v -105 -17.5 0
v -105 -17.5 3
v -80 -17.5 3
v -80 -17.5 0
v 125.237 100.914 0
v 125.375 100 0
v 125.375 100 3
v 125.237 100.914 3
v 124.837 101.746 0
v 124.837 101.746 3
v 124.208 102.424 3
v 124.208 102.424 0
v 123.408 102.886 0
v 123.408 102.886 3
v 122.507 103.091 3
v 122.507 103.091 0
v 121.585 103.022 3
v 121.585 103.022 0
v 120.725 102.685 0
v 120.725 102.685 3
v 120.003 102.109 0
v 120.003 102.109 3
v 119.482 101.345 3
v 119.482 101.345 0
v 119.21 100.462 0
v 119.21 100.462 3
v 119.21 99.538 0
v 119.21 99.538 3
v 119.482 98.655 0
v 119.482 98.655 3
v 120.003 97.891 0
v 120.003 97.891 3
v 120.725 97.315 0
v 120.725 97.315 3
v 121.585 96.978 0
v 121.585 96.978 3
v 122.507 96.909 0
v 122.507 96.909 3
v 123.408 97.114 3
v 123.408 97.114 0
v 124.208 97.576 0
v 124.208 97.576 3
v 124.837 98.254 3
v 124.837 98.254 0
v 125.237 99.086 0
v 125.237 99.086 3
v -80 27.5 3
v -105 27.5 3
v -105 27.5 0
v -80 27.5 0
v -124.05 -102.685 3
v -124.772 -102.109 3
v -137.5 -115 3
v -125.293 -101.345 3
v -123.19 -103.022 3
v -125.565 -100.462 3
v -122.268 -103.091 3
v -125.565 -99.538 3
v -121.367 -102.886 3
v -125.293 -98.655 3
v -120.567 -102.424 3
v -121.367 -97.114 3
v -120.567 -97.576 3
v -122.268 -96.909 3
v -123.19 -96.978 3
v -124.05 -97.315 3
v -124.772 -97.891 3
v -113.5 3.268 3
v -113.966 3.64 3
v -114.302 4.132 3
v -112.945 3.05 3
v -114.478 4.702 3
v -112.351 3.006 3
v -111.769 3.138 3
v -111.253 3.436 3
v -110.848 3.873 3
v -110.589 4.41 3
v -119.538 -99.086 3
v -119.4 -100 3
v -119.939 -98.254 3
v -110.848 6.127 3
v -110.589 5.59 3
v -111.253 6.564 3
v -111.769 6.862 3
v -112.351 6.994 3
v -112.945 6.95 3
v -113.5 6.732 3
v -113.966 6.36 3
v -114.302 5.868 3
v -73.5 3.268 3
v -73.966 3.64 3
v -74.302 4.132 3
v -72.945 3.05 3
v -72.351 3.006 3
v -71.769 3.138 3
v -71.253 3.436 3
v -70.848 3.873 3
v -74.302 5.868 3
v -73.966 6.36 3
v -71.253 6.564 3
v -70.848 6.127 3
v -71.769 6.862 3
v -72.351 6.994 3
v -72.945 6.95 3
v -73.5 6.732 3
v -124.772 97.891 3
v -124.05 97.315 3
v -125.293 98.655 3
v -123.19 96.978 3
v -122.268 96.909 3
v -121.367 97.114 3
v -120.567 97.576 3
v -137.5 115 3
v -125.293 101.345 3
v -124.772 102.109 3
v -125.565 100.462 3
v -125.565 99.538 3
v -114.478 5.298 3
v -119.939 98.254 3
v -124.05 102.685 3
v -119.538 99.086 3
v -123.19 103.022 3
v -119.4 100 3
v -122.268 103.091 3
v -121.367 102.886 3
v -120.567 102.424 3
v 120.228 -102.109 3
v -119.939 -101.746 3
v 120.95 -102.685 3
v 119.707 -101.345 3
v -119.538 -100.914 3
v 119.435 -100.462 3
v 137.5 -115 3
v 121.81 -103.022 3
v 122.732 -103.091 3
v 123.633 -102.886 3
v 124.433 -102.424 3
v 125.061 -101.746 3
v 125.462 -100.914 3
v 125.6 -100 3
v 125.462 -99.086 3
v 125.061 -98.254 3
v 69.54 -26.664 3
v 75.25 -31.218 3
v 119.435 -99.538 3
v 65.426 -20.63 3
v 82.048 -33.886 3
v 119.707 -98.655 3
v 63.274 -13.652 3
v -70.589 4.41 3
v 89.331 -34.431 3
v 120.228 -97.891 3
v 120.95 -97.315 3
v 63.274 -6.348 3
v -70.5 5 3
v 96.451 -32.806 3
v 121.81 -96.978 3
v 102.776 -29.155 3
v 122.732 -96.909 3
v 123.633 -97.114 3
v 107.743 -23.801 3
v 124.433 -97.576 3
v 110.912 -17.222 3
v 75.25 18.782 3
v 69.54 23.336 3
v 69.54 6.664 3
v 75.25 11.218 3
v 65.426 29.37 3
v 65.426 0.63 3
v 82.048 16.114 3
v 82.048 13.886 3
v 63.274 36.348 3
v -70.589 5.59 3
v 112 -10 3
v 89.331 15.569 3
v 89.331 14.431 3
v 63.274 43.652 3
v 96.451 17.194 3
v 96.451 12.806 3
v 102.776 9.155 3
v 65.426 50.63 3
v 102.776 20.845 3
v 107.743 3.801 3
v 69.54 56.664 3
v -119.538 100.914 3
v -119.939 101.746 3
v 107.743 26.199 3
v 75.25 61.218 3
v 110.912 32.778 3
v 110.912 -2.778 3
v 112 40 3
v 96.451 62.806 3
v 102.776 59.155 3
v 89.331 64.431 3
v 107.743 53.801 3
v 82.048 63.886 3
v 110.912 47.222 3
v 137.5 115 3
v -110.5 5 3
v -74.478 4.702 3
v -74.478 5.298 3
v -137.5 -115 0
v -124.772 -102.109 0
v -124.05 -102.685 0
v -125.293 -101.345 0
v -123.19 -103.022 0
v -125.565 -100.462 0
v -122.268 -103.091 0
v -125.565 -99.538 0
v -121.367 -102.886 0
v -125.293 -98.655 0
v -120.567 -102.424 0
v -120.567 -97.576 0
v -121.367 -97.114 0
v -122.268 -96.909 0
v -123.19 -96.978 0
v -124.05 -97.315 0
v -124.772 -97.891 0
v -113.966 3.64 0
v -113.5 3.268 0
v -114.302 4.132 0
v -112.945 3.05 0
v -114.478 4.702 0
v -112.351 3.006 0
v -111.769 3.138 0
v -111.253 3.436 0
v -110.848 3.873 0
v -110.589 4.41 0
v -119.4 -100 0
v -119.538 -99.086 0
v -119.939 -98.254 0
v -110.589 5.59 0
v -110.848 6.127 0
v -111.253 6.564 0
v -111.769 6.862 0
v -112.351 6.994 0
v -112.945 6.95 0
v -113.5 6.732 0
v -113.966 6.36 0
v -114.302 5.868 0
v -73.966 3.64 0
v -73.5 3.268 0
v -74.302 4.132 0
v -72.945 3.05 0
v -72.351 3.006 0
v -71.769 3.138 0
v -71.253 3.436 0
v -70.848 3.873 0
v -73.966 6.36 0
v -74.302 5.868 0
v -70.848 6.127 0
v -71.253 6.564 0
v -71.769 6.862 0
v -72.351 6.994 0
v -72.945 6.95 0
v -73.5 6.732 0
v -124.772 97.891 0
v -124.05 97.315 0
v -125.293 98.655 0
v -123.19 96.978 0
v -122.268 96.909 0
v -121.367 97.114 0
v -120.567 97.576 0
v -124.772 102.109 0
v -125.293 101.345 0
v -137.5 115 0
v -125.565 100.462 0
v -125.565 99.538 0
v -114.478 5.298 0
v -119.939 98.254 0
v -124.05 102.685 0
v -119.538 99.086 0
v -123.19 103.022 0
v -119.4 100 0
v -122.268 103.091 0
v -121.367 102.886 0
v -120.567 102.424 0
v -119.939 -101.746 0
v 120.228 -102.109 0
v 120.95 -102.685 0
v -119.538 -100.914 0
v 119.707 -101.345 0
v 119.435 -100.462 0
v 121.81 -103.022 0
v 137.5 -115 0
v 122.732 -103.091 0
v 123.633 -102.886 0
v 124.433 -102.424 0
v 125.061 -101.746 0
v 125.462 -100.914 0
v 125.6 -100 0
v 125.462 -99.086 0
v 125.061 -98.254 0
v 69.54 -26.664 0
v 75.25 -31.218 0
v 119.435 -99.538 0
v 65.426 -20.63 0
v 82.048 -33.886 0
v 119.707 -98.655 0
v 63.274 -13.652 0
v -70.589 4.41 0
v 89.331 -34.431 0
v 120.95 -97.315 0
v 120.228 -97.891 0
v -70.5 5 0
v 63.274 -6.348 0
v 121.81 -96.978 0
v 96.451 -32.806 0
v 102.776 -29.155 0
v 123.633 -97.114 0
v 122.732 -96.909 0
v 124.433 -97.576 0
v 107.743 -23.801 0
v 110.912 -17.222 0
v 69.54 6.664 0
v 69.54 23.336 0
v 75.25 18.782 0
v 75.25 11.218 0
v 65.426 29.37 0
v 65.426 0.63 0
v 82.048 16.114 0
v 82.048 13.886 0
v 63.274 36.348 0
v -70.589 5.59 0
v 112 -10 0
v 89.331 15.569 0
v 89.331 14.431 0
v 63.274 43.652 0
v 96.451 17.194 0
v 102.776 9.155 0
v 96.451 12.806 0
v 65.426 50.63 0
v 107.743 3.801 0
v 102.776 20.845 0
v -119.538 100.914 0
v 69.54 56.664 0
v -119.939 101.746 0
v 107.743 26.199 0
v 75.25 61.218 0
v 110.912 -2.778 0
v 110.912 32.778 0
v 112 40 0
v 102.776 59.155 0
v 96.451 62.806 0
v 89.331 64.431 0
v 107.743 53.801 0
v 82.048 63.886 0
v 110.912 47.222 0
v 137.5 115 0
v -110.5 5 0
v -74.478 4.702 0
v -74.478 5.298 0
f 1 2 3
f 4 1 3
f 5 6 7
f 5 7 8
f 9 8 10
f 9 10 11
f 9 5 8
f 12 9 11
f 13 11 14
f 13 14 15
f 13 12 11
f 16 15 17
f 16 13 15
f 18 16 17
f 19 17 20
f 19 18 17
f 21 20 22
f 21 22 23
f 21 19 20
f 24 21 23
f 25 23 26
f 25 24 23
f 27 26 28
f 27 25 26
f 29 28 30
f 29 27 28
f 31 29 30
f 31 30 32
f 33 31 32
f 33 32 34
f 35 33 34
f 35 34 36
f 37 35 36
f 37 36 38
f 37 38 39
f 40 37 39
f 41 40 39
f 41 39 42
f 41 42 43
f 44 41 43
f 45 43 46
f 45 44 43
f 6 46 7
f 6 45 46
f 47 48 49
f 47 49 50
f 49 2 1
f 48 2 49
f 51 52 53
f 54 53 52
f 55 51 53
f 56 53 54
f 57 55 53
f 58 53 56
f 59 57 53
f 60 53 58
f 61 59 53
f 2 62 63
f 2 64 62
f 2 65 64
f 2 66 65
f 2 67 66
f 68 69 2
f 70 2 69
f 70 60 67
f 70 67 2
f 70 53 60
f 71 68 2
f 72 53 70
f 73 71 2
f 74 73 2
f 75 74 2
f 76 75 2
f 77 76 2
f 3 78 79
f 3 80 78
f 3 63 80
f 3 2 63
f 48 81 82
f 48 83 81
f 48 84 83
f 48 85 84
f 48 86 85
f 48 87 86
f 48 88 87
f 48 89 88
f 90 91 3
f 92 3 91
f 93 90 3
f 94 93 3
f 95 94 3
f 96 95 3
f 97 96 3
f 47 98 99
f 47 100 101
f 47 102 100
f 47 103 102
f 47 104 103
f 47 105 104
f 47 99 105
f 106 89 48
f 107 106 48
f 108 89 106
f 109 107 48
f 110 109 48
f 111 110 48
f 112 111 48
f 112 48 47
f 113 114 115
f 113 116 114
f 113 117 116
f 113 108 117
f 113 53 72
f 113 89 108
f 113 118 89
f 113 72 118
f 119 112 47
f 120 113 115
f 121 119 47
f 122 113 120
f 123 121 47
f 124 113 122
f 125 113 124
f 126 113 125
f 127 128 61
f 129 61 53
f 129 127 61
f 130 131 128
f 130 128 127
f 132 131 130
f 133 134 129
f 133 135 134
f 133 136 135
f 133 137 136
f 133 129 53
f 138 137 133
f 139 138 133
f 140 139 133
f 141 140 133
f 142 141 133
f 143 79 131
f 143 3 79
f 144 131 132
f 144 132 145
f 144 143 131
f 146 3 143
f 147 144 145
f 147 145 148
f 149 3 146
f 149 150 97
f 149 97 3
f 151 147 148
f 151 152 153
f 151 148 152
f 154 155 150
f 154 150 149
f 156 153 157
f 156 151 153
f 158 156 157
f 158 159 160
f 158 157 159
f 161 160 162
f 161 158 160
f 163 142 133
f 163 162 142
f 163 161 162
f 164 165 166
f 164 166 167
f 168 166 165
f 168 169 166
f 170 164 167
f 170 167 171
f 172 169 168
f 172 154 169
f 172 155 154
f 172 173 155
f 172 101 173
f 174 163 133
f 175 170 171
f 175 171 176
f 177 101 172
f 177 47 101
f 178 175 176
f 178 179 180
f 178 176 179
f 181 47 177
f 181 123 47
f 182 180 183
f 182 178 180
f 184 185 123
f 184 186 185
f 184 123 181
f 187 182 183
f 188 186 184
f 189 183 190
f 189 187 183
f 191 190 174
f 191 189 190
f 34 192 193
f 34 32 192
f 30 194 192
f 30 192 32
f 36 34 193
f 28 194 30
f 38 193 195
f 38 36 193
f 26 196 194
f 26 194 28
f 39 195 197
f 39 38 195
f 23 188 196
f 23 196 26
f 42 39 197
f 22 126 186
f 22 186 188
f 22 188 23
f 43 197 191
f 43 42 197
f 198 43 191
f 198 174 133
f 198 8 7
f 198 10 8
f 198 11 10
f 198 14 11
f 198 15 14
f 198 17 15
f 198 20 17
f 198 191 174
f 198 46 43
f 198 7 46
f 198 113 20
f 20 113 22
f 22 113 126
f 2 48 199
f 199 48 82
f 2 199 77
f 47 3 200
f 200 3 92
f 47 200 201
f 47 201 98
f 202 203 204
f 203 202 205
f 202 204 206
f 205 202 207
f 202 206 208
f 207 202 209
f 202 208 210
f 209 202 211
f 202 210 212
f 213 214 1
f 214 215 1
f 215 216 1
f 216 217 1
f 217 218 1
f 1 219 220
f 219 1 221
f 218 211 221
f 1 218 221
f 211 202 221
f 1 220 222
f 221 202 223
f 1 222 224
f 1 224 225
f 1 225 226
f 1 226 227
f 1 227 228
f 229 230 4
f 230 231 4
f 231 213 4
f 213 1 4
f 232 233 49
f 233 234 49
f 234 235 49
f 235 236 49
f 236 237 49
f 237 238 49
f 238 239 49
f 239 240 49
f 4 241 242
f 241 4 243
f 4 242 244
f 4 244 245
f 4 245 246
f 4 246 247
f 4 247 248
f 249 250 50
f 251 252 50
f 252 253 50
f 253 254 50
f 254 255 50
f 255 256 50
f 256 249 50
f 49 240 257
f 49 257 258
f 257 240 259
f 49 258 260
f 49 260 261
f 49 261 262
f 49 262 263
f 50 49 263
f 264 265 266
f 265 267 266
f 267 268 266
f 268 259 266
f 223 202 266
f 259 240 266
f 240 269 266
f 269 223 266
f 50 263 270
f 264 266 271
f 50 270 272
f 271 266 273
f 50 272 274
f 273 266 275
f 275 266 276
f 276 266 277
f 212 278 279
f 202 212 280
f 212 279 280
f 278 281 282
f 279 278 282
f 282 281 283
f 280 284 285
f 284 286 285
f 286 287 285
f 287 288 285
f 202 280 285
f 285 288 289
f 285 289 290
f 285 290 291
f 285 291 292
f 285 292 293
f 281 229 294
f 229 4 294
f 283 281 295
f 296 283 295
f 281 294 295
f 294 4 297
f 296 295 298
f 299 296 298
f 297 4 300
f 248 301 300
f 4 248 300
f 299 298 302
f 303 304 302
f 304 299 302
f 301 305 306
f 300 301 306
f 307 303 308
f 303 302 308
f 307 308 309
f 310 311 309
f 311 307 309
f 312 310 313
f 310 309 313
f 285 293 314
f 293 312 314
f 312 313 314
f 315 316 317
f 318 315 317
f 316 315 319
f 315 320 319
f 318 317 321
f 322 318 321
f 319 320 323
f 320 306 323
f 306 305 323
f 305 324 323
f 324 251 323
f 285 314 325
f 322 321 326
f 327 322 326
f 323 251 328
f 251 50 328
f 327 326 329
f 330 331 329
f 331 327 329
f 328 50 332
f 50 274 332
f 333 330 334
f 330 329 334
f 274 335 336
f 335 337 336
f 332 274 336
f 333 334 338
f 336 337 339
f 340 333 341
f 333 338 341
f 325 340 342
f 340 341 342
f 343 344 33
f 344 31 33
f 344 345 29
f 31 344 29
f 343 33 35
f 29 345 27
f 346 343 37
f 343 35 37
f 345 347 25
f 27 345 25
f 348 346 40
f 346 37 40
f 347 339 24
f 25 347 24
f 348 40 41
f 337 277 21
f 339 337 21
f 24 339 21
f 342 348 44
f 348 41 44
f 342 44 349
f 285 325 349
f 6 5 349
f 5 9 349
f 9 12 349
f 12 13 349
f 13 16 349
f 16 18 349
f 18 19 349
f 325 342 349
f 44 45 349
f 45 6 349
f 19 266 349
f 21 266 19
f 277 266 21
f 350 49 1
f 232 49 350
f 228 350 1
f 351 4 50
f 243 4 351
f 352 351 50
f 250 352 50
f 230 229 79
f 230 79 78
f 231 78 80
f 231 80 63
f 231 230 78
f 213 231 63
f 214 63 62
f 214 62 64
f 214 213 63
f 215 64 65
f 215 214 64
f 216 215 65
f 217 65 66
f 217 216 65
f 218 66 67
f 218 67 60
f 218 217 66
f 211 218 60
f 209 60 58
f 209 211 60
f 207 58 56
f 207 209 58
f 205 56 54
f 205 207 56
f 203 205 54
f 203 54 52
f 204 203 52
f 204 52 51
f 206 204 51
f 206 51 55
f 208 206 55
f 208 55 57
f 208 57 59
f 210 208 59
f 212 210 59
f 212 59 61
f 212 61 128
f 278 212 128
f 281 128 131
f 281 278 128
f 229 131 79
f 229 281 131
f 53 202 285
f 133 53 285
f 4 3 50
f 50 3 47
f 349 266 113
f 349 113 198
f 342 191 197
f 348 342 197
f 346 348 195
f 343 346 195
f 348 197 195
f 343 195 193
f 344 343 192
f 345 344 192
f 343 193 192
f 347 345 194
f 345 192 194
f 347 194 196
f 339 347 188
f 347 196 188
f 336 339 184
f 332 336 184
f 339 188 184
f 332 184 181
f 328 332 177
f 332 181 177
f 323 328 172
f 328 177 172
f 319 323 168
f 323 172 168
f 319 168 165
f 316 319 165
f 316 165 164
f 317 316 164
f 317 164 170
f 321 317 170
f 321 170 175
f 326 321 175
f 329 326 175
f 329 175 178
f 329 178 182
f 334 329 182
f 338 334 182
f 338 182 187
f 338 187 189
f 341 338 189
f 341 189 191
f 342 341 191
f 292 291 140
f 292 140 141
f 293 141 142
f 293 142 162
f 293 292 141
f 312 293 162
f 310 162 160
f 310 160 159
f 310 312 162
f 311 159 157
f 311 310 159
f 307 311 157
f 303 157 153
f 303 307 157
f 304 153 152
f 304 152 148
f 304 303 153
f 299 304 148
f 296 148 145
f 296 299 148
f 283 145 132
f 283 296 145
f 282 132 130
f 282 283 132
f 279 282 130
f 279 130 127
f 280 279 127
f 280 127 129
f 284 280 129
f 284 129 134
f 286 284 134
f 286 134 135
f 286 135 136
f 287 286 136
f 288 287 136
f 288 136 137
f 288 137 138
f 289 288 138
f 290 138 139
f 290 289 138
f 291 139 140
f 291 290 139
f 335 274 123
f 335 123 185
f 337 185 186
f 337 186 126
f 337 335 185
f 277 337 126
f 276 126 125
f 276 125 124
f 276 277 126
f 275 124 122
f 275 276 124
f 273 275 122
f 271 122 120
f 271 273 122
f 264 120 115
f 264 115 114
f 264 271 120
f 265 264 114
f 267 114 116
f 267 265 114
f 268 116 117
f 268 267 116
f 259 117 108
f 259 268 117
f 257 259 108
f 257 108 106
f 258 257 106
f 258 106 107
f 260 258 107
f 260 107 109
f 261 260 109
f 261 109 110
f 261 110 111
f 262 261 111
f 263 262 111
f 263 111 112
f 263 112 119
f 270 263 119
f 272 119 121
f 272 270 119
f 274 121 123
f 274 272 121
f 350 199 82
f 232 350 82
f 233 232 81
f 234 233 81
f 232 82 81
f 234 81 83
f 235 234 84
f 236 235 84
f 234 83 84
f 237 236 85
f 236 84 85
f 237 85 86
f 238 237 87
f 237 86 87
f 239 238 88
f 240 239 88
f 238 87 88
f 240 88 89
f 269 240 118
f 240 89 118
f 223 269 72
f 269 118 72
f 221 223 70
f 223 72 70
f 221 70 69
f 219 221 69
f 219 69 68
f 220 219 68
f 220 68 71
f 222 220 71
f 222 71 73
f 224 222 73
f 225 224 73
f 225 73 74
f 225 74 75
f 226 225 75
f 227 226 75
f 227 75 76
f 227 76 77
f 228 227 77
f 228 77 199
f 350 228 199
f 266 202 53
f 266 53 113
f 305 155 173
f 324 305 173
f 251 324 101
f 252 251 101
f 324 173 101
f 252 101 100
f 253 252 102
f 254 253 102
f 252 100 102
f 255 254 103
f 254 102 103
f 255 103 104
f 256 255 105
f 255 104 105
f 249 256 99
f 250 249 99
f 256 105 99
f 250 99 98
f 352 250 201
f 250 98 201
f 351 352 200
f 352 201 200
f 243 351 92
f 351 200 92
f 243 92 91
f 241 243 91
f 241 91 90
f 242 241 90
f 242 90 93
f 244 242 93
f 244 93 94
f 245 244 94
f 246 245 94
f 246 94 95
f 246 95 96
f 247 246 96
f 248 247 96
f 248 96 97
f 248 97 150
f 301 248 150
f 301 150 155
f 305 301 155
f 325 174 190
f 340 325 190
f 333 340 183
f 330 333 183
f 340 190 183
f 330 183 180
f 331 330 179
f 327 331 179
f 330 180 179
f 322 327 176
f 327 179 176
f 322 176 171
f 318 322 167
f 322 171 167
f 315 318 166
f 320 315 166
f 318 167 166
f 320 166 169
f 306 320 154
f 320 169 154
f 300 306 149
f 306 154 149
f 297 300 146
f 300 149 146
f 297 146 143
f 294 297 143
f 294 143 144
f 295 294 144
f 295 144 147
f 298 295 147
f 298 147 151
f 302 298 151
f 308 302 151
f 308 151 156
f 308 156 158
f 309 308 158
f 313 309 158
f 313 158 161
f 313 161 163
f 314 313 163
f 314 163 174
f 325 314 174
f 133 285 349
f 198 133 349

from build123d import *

# Parameters (mm, degrees)
CROQUIS1_W              = 275
CROQUIS1_H              = 230
CROQUIS1_R              = 3.1
SALIENTE_EXTRUIR1_DEPTH = 3
CROQUIS2_R              = 24.5
CORTAR_EXTRUIR1_DEPTH   = 4
CROQUIS3_R              = 2
CROQUIS3_W              = 25
CROQUIS3_H              = 45
CORTAR_EXTRUIR2_DEPTH   = 4


with BuildPart() as part:
    # Croquis1 → Saliente-Extruir1 (new body)
    with BuildSketch(Plane.XY):
        Rectangle(CROQUIS1_W, CROQUIS1_H)
        with Locations((-122.5, 100)):
            Circle(CROQUIS1_R, mode=Mode.SUBTRACT)
        with Locations((122.275174875, 100)):
            Circle(CROQUIS1_R, mode=Mode.SUBTRACT)
        with Locations((-122.5, -100)):
            Circle(CROQUIS1_R, mode=Mode.SUBTRACT)
        with Locations((122.5, -100)):
            Circle(CROQUIS1_R, mode=Mode.SUBTRACT)
    extrude(amount=SALIENTE_EXTRUIR1_DEPTH)

    # Croquis2 → Cortar-Extruir1 (cut, through all)
    with BuildSketch(Plane.XY.offset(3)):
        with Locations((87.5, 40)):
            Circle(CROQUIS2_R)
        with Locations((87.5, -10)):
            Circle(CROQUIS2_R)
    extrude(amount=-CORTAR_EXTRUIR1_DEPTH, mode=Mode.SUBTRACT)

    # Croquis3 → Cortar-Extruir2 (cut, through all)
    with BuildSketch(Plane.XY.offset(3)):
        with Locations((-112.5, 5)):
            Circle(CROQUIS3_R)
        with Locations((-72.5, 5)):
            Circle(CROQUIS3_R)
        with Locations((-92.5, 5)):
            Rectangle(CROQUIS3_W, CROQUIS3_H)
    extrude(amount=-CORTAR_EXTRUIR2_DEPTH, mode=Mode.SUBTRACT)


solid = part.part
